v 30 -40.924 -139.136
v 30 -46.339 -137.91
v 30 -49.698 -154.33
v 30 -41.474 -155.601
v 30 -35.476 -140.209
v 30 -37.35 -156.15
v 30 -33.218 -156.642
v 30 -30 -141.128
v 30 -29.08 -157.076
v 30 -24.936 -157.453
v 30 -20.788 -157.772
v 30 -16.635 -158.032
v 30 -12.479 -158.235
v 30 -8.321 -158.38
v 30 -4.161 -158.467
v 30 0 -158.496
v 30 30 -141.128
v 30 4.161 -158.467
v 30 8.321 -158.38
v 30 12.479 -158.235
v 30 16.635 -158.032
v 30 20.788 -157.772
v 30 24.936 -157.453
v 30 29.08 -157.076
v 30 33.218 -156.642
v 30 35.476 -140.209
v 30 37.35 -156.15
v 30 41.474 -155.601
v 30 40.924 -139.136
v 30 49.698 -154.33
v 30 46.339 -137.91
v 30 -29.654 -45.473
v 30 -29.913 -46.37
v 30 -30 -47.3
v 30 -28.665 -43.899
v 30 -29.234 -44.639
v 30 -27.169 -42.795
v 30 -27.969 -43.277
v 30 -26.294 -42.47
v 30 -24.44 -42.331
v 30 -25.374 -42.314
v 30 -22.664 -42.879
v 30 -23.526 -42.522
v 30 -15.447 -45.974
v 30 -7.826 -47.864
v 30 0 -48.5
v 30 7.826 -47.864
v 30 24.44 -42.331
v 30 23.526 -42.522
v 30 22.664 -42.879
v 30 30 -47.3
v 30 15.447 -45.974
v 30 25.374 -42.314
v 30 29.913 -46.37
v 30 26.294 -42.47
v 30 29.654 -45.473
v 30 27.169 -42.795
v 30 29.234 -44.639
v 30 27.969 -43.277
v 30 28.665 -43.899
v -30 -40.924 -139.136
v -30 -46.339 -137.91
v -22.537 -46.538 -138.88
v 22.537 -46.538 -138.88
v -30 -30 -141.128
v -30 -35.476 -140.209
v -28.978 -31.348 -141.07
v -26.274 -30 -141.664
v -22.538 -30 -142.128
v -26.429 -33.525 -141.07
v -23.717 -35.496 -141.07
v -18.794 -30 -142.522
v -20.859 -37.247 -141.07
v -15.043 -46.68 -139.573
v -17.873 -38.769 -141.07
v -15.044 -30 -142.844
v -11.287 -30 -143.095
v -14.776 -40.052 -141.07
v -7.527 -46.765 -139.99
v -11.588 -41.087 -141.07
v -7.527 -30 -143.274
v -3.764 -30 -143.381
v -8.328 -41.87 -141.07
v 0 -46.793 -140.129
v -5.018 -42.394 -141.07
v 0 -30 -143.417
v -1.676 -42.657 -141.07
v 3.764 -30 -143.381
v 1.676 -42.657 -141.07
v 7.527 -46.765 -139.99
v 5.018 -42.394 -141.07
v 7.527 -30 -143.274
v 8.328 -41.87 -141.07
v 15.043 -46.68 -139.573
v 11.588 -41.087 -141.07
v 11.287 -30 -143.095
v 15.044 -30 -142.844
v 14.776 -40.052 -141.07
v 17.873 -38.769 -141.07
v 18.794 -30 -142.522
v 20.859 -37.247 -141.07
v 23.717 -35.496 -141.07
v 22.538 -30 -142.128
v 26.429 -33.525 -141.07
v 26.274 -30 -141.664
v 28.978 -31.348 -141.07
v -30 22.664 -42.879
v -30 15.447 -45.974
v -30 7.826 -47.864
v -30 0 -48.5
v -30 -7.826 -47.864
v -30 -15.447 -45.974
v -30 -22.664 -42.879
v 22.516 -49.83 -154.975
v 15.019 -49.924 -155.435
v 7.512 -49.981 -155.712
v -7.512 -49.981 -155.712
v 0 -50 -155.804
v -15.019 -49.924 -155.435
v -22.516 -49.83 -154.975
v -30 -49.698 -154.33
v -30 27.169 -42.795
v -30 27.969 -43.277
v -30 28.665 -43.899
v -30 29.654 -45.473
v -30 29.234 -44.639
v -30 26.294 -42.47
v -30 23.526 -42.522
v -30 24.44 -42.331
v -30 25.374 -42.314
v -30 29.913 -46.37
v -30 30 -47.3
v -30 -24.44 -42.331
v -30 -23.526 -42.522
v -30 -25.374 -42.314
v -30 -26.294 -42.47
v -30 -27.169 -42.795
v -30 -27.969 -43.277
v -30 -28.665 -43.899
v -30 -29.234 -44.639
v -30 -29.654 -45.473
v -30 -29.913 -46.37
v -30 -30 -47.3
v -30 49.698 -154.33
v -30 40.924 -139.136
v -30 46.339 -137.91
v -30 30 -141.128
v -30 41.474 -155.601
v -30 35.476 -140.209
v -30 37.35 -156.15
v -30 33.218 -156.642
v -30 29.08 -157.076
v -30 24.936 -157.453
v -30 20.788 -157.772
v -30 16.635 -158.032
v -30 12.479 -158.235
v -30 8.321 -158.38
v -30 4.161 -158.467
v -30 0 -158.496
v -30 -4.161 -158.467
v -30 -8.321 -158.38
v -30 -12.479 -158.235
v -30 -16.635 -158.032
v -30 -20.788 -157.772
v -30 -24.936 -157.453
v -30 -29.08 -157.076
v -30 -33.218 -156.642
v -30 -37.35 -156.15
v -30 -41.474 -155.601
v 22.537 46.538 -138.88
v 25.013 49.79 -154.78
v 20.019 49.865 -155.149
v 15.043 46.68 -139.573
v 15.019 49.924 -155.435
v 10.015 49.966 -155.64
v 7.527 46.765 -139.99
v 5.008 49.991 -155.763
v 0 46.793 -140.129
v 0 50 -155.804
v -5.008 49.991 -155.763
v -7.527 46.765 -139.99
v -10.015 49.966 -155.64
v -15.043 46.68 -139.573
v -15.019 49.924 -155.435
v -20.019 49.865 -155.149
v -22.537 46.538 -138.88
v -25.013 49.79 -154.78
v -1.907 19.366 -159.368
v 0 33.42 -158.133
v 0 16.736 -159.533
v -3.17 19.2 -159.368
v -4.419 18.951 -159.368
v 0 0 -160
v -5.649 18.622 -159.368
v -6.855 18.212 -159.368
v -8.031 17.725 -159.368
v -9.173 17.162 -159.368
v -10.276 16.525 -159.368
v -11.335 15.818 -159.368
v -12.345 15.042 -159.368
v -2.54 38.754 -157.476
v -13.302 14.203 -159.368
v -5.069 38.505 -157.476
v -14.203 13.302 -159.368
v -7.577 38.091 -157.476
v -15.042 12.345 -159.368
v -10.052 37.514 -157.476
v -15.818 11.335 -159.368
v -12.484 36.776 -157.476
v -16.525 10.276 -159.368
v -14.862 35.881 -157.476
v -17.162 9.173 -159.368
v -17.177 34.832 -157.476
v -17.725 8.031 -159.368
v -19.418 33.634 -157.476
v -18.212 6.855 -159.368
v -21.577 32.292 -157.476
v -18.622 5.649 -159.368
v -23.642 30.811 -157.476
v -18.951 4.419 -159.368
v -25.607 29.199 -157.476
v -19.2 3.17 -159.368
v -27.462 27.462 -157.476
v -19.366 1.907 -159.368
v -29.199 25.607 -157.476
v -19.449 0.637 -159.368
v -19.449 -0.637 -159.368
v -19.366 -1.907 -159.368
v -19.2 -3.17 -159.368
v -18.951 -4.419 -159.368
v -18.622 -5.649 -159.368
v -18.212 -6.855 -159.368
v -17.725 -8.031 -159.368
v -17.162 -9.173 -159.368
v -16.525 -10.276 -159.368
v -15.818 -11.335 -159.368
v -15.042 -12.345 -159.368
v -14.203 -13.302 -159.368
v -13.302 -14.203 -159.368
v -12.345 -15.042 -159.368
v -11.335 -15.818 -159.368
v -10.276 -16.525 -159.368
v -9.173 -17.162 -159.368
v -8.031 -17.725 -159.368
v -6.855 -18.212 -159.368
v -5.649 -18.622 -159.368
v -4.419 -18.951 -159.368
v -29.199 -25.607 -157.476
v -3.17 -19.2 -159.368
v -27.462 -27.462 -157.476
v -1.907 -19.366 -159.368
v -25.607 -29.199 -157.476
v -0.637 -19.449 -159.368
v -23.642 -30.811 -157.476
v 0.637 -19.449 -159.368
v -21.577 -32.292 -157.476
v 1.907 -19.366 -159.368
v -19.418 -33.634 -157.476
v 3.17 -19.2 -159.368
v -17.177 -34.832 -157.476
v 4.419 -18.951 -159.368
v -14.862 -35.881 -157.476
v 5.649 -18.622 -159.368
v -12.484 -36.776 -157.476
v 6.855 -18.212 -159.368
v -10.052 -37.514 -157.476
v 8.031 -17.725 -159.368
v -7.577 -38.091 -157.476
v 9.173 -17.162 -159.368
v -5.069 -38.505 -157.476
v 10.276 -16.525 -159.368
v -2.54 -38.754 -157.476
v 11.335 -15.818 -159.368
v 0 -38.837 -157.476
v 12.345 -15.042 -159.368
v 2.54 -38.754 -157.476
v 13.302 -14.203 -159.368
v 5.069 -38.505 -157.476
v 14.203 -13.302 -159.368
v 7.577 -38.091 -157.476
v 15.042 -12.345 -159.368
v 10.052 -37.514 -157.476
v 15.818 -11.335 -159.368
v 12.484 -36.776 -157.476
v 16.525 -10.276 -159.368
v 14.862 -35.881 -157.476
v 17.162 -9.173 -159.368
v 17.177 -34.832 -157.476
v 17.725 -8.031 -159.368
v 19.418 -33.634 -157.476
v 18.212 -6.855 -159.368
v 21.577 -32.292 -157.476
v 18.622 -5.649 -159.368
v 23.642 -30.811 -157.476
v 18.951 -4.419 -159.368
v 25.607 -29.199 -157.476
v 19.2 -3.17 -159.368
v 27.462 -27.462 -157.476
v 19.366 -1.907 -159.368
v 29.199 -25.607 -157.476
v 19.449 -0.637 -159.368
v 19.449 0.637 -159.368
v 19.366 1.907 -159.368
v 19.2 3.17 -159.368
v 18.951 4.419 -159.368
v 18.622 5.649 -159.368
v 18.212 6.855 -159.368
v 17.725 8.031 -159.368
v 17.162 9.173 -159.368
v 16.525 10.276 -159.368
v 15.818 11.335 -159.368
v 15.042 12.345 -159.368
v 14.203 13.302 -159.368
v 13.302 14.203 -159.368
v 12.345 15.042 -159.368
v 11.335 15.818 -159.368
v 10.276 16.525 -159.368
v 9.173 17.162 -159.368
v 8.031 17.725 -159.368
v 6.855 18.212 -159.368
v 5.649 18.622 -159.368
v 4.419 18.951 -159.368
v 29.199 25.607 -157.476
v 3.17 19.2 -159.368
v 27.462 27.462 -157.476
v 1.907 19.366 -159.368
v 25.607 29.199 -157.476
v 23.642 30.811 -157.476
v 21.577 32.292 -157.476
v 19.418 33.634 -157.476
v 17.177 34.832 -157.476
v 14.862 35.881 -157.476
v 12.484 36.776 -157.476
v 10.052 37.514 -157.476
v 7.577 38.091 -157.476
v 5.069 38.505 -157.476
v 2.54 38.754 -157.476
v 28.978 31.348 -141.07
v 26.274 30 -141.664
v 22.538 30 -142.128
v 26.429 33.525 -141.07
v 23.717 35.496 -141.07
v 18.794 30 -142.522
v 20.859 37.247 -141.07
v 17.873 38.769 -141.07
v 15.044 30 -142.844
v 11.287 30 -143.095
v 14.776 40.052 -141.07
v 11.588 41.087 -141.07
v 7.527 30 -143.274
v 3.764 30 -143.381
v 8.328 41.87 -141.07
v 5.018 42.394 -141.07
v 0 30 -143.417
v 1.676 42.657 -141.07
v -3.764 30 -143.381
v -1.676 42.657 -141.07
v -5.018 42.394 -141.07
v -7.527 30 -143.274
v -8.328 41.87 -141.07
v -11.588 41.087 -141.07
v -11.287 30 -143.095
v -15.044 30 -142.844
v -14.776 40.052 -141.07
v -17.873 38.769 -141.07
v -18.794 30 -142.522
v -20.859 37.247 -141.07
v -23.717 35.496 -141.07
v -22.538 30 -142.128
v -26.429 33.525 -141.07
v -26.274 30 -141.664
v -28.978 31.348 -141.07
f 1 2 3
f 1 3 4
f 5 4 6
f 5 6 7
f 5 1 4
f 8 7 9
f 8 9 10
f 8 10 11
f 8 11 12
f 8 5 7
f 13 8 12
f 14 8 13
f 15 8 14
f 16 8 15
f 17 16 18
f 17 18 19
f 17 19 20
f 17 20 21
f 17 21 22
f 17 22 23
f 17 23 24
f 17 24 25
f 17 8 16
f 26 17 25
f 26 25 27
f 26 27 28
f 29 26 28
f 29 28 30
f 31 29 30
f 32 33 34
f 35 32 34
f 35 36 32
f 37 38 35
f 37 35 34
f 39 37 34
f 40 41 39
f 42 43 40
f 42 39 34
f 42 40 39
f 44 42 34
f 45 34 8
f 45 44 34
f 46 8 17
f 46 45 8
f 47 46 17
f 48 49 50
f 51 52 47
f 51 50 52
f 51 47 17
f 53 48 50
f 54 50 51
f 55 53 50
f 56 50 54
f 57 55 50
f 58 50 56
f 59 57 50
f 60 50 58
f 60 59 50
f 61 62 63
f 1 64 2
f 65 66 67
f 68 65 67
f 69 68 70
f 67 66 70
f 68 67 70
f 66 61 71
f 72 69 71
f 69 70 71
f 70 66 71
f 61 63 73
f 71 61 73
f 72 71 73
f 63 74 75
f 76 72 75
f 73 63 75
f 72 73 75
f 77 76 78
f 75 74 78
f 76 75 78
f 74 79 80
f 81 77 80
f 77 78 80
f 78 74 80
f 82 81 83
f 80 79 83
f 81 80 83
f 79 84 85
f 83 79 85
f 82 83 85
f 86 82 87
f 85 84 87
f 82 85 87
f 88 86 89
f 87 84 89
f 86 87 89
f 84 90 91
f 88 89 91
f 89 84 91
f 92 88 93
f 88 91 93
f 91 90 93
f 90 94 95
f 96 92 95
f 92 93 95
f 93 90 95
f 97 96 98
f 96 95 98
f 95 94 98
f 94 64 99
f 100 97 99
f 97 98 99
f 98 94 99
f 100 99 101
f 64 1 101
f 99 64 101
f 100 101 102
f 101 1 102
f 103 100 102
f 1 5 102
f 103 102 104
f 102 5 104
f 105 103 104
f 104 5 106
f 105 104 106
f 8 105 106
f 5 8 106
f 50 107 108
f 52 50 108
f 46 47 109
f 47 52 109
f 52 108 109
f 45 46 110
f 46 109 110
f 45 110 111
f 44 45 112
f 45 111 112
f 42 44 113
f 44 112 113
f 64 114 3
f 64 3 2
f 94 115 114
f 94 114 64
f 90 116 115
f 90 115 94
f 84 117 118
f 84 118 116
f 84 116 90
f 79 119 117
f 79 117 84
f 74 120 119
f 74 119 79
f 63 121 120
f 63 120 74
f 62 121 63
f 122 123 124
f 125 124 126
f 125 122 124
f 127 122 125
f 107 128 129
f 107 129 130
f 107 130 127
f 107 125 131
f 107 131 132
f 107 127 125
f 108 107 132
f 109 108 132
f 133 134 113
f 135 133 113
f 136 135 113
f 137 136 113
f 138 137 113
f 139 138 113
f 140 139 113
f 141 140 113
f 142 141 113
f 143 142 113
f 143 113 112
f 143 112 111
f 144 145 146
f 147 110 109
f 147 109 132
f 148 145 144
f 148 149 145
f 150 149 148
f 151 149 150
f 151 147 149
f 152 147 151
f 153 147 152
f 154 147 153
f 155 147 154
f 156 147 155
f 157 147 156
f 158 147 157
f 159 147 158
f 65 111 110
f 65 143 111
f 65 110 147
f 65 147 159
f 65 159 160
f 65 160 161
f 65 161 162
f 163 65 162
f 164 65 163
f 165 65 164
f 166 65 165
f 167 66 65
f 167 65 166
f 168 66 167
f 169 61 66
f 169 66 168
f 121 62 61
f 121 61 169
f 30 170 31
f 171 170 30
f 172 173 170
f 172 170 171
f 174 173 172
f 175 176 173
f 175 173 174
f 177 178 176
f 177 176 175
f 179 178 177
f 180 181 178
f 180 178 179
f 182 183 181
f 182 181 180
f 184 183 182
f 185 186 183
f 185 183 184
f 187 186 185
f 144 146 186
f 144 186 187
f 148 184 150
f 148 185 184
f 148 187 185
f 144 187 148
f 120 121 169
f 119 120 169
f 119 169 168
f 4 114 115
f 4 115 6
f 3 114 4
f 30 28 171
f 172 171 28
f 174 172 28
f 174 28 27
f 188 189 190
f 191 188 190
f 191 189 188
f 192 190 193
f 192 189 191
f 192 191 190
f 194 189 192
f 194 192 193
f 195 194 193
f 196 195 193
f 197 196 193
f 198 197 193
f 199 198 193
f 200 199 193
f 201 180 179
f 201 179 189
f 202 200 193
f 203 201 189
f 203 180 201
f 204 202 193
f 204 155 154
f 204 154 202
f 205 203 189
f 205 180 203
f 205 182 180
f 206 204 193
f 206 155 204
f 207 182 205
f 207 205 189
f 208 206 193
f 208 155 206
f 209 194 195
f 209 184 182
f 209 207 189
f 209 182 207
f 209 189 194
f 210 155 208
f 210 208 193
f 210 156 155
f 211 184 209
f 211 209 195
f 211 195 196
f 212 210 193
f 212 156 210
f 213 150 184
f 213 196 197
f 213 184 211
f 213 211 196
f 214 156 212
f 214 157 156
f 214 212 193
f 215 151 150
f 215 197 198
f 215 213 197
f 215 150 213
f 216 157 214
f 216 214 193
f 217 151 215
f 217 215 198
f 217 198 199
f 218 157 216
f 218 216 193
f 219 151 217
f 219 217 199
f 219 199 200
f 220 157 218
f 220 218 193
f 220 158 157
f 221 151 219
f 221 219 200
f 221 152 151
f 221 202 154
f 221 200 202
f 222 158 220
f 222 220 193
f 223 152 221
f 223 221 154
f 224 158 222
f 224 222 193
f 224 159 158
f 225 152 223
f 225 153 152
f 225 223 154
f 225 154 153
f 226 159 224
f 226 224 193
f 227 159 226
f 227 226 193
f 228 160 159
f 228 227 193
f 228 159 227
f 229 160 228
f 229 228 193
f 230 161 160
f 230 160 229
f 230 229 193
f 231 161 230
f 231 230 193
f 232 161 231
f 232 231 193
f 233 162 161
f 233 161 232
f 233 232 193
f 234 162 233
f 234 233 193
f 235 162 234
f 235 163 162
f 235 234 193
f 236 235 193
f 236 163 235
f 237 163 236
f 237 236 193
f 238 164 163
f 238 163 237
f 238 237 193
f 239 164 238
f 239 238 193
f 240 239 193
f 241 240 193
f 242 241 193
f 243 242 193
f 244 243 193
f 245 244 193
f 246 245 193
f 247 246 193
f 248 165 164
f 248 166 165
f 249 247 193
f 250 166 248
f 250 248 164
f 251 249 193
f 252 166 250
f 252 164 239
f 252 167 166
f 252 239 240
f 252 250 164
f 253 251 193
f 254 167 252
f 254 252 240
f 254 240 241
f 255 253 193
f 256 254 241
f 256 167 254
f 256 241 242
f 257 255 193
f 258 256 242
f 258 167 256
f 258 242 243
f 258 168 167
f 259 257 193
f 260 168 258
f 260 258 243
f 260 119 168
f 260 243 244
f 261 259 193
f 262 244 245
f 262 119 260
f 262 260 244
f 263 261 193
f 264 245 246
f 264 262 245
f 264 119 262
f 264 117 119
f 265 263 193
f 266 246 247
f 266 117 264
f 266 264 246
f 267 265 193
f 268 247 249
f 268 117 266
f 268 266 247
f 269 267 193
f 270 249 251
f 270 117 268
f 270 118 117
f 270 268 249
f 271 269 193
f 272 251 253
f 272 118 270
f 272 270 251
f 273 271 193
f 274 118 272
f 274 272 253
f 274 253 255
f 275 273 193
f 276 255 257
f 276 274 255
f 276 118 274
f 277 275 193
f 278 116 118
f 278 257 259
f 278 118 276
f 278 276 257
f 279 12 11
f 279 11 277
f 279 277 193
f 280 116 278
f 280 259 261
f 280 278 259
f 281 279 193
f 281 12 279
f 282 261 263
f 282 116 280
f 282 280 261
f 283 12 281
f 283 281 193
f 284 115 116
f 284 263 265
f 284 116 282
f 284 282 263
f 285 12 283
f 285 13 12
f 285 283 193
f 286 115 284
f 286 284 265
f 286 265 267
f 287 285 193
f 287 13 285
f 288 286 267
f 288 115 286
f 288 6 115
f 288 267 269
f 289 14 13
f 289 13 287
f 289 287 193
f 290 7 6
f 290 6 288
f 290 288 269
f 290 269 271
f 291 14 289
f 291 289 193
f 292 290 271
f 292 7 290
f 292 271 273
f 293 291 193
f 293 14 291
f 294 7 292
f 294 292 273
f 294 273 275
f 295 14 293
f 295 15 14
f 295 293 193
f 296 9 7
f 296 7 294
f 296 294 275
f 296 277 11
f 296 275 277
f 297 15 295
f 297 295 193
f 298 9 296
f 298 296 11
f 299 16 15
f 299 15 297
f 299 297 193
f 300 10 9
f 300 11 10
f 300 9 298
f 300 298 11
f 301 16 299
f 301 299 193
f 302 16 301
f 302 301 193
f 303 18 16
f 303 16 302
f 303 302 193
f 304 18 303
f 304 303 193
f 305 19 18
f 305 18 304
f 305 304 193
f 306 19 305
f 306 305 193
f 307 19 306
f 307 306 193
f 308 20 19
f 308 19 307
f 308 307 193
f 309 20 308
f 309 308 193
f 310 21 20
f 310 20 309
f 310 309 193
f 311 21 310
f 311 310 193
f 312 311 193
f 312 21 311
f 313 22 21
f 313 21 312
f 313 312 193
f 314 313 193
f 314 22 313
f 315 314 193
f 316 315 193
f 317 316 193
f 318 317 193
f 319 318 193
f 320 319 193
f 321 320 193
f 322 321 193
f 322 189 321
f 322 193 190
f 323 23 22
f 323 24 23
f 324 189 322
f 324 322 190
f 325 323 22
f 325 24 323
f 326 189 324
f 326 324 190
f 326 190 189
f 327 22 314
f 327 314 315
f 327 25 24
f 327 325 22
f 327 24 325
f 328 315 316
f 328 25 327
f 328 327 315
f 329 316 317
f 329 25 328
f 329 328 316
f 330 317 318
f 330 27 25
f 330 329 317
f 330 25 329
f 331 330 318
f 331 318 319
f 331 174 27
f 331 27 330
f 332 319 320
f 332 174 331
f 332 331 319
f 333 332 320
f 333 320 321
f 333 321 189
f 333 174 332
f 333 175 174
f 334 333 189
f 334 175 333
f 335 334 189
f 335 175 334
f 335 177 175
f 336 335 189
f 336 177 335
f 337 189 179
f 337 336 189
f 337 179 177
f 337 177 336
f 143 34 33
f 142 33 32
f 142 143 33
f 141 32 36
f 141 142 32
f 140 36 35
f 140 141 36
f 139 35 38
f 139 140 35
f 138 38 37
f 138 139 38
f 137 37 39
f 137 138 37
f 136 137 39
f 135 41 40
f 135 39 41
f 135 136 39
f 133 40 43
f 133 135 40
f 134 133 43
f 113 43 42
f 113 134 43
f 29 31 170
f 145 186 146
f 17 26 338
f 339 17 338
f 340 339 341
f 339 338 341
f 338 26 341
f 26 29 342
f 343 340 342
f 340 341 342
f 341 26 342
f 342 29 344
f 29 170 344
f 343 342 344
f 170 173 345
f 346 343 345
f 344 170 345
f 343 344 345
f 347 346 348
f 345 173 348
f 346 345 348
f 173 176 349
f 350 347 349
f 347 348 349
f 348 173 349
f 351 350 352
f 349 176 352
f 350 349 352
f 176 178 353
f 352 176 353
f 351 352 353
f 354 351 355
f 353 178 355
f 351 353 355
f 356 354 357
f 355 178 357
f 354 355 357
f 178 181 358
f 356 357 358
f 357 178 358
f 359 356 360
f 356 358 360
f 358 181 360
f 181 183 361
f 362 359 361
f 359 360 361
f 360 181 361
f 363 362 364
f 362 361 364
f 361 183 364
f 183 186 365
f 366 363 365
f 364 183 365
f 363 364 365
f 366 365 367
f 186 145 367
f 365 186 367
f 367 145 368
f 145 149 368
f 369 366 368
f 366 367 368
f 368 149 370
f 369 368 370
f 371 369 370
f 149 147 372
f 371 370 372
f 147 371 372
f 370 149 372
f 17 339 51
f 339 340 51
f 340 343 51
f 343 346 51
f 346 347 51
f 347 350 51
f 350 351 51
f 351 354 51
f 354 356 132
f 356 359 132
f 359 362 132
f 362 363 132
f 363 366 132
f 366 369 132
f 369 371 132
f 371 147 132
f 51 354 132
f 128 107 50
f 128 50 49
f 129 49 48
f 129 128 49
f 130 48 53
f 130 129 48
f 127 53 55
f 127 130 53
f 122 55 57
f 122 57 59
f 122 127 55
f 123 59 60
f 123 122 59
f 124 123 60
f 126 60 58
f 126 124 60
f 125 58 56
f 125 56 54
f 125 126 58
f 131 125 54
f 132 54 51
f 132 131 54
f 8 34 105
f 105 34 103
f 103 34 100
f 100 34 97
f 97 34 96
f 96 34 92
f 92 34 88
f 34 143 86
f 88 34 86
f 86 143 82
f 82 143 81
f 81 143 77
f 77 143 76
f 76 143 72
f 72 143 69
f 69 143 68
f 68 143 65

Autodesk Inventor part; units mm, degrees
sketch "Sketch17" plane through (0, 0, 0) normal (1, 0, 0) x (0, 1, 0)
  line L0 (-151.0923, 0) -> (102.6542, 0) construction
  line L1 (0, -220) -> (0, 200) projected
  circle A0 centre (0, 0) radius 40
  circle A1 centre (0, 0) radius 48.5
  arc A2 (-55.3685, -137.8628) -> (55.3685, -137.8628) centre (0, 54.3203) ccw
  arc A3 (-60, -153.9388) -> (60, -153.9388) centre (0, 140) ccw
  line L2 (55.3685, -137.8628) -> (60, -153.9388)
  line L3 (-60, -153.9388) -> (-55.3685, -137.8628)
  line L4 (-30, -38.1084) -> (-30, -145.6797)
  line L5 (-30, -145.6797) -> (30, -145.6797)
  line L6 (30, -145.6797) -> (30, -38.1084)
  line L7 (-46.7931, -140.1287) -> (-50, -155.804)
  line L8 (46.7931, -140.1287) -> (50, -155.804)
  line L9 (-50, -155.804) -> (-28.8985, -159.3708) construction
  line L10 (-46.7931, -140.1287) -> (-25.9862, -145.1357) construction
  line L11 (-48.3965, -147.9663) -> (-7.733, -156.2855) construction
  arc A4 (26.4209, -129.6797) -> (26, -145.6797) centre (66.4047, -138.7371) ccw
  arc A5 (26.4209, -129.6797) -> (30, -97.6797) centre (-114.8428, -97.6797) ccw
  point P0 (0, -160)
  point P1 (0, -145.6797)
  point P2 (0, -160)
  point P3 (0, -48.5)
  point P4 (0, -145.6797)
  dimension "d173" = 97
  dimension "d174" = 80
  dimension "d224" = 60
  dimension "d229" = 160
  dimension "d230" = 300
  dimension "d231" = 16.7299
  dimension "d232" = 100
  dimension "d233" = 10
  dimension "d235" = 200
  dimension "d241" = 16
  dimension "d242" = 16.7931
  dimension "d243" = 16
  dimension "d244" = 32
  dimension "d245" = 26
sketch "Sketch16" plane through (0, 0, 0) normal (1, 0, 0) x (0, 1, 0)
  circle A0 centre (0, 0) radius 40
  circle A1 centre (0, 0) radius 48.5
  line L0 (0, -201.7) -> (0, 90.2) construction
  line L1 (0, -160) -> (0, -48.5)
  line L2 (30, -38.1084) -> (30, -103.6436)
  line L3 (30, -103.6436) -> (25, -132)
  line L4 (25, -132) -> (50, -132)
  line L5 (50, -132) -> (50, -160)
  line L6 (50, -160) -> (0, -160)
  dimension "d156" = 97
  dimension "d157" = 80
  dimension "d202" = 28
  dimension "d203" = 60
  dimension "d204" = 50
  dimension "d206" = 160
  dimension "d209" = 50
  dimension "d210" = 80
  dimension "d211" = 28.7938
extrude "Extrusion14" [suppressed]
fillet "Fillet10" [suppressed]
mirror "Mirror1" [suppressed]
thicken "Thicken1" [suppressed]
sketch "Sketch19" plane through (0, 0, 0) normal (0, 1, 0) x (-1, 0, 0)
  arc A0 (-110.8458, -111.0605) -> (110.8458, -111.0605) centre (0, -10) ccw
  line L0 (155.1841, 0) -> (-155.1841, 0) projected
  line L1 (0, -264.129) -> (0, 44.0215) projected
  line L2 (110.8458, -111.0605) -> (110.8458, -220.1075)
  line L3 (110.8458, -220.1075) -> (-110.8458, -220.1075)
  line L4 (-110.8458, -220.1075) -> (-110.8458, -111.0605)
  point P0 (0, 0)
  point P1 (0, -160)
  point P2 (0, -160)
  point P3 (0, -220.1075)
  dimension "d217" = 150
  dimension "d218" = 0
revolve "Revolution1" [suppressed]
fillet "Fillet15" [suppressed]
revolve "Revolution2" add sketch "Sketch17" angle 360 about axis through (0, 0, -10) along (0, 0, 1) separate body contours L1 L5 L6 A2 L8 A3 | A2 A4 L5 | L8 A2 L2 A3 | A2 L6 L5 A4
ref_plane "Work Plane7" through (0, -46.7931, -140.1287) normal (0, -0.9797, 0.2004) x (0, -0.2004, -0.9797)
split "Split2" plane through (0, -46.7931, -140.1287) removes the side toward (0, -0.9797, 0.2004)
ref_plane "Work Plane8" through (0, 46.7931, -140.1287) normal (0, -0.9797, -0.2004) x (0, 0.2004, -0.9797)
split "Split3" plane through (0, 46.7931, -140.1287) removes the side toward (0, 0.9797, 0.2004)
ref_plane "Work Plane9" through (-30, 0, 0) normal (1, 0, 0) x (0, 1, 0)
split "Split4" plane through (-30, 0, 0) removes the side toward (-1, 0, 0)
ref_plane "Work Plane10" through (30, 0, 0) normal (1, 0, 0) x (0, 1, 0)
split "Split5" plane through (30, 0, 0) removes the side toward (1, 0, 0)
extrude "Extrusion17" add sketch "Sketch17" along normal mid plane 60 contours L1 A1 L6 A5 A4 A2 | A2 A4 L5 | A4 A5 L6 A2 | A2 L6 L5 A4
fillet "Fillet16" radius 5 1 edges at (0, 30, -38.1084)
mirror "Mirror4" about plane through (0, 0, 0) normal (0, 1, 0) of "Extrusion17", "Fillet16"
properties part number "shank_2"
